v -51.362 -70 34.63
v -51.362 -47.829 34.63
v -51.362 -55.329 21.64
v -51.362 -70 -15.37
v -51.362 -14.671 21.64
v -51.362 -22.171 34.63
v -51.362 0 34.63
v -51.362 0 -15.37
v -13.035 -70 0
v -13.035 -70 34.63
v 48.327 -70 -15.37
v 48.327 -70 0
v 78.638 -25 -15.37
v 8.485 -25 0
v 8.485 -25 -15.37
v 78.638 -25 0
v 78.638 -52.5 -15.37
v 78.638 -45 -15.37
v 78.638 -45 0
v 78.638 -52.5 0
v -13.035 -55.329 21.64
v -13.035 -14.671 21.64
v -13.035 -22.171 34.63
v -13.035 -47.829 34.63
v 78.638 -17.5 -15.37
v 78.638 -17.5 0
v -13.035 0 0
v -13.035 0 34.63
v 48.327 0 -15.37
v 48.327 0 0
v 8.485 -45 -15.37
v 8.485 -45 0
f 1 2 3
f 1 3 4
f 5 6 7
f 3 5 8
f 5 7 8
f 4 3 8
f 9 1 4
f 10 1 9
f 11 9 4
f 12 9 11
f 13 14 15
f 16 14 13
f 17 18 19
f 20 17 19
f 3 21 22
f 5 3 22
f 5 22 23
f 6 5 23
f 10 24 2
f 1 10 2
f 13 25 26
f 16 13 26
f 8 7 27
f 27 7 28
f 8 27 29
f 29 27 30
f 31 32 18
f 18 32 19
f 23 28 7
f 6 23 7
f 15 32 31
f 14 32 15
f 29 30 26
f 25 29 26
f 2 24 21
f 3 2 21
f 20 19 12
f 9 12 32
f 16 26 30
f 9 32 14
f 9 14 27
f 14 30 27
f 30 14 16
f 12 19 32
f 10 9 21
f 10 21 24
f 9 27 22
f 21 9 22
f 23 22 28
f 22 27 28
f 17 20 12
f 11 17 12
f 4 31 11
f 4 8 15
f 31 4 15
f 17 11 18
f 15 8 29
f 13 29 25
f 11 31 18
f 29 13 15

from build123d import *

# Parameters (mm, degrees)
F1_DEPTH = 70
F3_DEPTH = 38.3278513458
F4_W     = 70.1527081109
F4_H     = 20
F5_DEPTH = 15.3706480632
F8_DEPTH = 15.3706480632


with BuildPart() as f1:
    # F0 (on Front) → F1 (new body)
    with BuildSketch(Plane.XZ):
        Polygon((-13.0350217989, 34.6303519368), (-51.3618731447, 34.6303519368), (-51.3618731447, -15.3696480632), (78.6381268553, -15.3696480632), (78.6381268553, 0), (-13.0350217989, 0), align=None)
    extrude(amount=F1_DEPTH)

    # F2 (on face) → F3 (cut, through all)
    with BuildSketch(Plane.YZ.offset(-13.0350217989)):
        Polygon((-22.1706290543, 34.6303519368), (-47.8293709457, 34.6303519368), (-55.3293709457, 21.6399708801), (-35, 21.6399708801), (-14.6706290543, 21.6399708801), align=None)
    extrude(amount=-F3_DEPTH, mode=Mode.SUBTRACT)

    # F4 (on face) → F5 (cut, through all)
    with BuildSketch(Plane.XY):
        with Locations((43.5617727999, -35)):
            Rectangle(F4_W, F4_H)
    extrude(amount=-F5_DEPTH, mode=Mode.SUBTRACT)

    # F7 (on face) → F8 (cut, through all)
    with BuildSketch(Plane.XY):
        Polygon((78.6381268553, -52.5), (48.3272377229, -70), (78.6381268553, -70), align=None)
        Polygon((48.3272377229, 0), (78.6381268553, -17.5), (78.6381268553, 0), align=None)
    extrude(amount=-F8_DEPTH, mode=Mode.SUBTRACT)


solid = f1.part
